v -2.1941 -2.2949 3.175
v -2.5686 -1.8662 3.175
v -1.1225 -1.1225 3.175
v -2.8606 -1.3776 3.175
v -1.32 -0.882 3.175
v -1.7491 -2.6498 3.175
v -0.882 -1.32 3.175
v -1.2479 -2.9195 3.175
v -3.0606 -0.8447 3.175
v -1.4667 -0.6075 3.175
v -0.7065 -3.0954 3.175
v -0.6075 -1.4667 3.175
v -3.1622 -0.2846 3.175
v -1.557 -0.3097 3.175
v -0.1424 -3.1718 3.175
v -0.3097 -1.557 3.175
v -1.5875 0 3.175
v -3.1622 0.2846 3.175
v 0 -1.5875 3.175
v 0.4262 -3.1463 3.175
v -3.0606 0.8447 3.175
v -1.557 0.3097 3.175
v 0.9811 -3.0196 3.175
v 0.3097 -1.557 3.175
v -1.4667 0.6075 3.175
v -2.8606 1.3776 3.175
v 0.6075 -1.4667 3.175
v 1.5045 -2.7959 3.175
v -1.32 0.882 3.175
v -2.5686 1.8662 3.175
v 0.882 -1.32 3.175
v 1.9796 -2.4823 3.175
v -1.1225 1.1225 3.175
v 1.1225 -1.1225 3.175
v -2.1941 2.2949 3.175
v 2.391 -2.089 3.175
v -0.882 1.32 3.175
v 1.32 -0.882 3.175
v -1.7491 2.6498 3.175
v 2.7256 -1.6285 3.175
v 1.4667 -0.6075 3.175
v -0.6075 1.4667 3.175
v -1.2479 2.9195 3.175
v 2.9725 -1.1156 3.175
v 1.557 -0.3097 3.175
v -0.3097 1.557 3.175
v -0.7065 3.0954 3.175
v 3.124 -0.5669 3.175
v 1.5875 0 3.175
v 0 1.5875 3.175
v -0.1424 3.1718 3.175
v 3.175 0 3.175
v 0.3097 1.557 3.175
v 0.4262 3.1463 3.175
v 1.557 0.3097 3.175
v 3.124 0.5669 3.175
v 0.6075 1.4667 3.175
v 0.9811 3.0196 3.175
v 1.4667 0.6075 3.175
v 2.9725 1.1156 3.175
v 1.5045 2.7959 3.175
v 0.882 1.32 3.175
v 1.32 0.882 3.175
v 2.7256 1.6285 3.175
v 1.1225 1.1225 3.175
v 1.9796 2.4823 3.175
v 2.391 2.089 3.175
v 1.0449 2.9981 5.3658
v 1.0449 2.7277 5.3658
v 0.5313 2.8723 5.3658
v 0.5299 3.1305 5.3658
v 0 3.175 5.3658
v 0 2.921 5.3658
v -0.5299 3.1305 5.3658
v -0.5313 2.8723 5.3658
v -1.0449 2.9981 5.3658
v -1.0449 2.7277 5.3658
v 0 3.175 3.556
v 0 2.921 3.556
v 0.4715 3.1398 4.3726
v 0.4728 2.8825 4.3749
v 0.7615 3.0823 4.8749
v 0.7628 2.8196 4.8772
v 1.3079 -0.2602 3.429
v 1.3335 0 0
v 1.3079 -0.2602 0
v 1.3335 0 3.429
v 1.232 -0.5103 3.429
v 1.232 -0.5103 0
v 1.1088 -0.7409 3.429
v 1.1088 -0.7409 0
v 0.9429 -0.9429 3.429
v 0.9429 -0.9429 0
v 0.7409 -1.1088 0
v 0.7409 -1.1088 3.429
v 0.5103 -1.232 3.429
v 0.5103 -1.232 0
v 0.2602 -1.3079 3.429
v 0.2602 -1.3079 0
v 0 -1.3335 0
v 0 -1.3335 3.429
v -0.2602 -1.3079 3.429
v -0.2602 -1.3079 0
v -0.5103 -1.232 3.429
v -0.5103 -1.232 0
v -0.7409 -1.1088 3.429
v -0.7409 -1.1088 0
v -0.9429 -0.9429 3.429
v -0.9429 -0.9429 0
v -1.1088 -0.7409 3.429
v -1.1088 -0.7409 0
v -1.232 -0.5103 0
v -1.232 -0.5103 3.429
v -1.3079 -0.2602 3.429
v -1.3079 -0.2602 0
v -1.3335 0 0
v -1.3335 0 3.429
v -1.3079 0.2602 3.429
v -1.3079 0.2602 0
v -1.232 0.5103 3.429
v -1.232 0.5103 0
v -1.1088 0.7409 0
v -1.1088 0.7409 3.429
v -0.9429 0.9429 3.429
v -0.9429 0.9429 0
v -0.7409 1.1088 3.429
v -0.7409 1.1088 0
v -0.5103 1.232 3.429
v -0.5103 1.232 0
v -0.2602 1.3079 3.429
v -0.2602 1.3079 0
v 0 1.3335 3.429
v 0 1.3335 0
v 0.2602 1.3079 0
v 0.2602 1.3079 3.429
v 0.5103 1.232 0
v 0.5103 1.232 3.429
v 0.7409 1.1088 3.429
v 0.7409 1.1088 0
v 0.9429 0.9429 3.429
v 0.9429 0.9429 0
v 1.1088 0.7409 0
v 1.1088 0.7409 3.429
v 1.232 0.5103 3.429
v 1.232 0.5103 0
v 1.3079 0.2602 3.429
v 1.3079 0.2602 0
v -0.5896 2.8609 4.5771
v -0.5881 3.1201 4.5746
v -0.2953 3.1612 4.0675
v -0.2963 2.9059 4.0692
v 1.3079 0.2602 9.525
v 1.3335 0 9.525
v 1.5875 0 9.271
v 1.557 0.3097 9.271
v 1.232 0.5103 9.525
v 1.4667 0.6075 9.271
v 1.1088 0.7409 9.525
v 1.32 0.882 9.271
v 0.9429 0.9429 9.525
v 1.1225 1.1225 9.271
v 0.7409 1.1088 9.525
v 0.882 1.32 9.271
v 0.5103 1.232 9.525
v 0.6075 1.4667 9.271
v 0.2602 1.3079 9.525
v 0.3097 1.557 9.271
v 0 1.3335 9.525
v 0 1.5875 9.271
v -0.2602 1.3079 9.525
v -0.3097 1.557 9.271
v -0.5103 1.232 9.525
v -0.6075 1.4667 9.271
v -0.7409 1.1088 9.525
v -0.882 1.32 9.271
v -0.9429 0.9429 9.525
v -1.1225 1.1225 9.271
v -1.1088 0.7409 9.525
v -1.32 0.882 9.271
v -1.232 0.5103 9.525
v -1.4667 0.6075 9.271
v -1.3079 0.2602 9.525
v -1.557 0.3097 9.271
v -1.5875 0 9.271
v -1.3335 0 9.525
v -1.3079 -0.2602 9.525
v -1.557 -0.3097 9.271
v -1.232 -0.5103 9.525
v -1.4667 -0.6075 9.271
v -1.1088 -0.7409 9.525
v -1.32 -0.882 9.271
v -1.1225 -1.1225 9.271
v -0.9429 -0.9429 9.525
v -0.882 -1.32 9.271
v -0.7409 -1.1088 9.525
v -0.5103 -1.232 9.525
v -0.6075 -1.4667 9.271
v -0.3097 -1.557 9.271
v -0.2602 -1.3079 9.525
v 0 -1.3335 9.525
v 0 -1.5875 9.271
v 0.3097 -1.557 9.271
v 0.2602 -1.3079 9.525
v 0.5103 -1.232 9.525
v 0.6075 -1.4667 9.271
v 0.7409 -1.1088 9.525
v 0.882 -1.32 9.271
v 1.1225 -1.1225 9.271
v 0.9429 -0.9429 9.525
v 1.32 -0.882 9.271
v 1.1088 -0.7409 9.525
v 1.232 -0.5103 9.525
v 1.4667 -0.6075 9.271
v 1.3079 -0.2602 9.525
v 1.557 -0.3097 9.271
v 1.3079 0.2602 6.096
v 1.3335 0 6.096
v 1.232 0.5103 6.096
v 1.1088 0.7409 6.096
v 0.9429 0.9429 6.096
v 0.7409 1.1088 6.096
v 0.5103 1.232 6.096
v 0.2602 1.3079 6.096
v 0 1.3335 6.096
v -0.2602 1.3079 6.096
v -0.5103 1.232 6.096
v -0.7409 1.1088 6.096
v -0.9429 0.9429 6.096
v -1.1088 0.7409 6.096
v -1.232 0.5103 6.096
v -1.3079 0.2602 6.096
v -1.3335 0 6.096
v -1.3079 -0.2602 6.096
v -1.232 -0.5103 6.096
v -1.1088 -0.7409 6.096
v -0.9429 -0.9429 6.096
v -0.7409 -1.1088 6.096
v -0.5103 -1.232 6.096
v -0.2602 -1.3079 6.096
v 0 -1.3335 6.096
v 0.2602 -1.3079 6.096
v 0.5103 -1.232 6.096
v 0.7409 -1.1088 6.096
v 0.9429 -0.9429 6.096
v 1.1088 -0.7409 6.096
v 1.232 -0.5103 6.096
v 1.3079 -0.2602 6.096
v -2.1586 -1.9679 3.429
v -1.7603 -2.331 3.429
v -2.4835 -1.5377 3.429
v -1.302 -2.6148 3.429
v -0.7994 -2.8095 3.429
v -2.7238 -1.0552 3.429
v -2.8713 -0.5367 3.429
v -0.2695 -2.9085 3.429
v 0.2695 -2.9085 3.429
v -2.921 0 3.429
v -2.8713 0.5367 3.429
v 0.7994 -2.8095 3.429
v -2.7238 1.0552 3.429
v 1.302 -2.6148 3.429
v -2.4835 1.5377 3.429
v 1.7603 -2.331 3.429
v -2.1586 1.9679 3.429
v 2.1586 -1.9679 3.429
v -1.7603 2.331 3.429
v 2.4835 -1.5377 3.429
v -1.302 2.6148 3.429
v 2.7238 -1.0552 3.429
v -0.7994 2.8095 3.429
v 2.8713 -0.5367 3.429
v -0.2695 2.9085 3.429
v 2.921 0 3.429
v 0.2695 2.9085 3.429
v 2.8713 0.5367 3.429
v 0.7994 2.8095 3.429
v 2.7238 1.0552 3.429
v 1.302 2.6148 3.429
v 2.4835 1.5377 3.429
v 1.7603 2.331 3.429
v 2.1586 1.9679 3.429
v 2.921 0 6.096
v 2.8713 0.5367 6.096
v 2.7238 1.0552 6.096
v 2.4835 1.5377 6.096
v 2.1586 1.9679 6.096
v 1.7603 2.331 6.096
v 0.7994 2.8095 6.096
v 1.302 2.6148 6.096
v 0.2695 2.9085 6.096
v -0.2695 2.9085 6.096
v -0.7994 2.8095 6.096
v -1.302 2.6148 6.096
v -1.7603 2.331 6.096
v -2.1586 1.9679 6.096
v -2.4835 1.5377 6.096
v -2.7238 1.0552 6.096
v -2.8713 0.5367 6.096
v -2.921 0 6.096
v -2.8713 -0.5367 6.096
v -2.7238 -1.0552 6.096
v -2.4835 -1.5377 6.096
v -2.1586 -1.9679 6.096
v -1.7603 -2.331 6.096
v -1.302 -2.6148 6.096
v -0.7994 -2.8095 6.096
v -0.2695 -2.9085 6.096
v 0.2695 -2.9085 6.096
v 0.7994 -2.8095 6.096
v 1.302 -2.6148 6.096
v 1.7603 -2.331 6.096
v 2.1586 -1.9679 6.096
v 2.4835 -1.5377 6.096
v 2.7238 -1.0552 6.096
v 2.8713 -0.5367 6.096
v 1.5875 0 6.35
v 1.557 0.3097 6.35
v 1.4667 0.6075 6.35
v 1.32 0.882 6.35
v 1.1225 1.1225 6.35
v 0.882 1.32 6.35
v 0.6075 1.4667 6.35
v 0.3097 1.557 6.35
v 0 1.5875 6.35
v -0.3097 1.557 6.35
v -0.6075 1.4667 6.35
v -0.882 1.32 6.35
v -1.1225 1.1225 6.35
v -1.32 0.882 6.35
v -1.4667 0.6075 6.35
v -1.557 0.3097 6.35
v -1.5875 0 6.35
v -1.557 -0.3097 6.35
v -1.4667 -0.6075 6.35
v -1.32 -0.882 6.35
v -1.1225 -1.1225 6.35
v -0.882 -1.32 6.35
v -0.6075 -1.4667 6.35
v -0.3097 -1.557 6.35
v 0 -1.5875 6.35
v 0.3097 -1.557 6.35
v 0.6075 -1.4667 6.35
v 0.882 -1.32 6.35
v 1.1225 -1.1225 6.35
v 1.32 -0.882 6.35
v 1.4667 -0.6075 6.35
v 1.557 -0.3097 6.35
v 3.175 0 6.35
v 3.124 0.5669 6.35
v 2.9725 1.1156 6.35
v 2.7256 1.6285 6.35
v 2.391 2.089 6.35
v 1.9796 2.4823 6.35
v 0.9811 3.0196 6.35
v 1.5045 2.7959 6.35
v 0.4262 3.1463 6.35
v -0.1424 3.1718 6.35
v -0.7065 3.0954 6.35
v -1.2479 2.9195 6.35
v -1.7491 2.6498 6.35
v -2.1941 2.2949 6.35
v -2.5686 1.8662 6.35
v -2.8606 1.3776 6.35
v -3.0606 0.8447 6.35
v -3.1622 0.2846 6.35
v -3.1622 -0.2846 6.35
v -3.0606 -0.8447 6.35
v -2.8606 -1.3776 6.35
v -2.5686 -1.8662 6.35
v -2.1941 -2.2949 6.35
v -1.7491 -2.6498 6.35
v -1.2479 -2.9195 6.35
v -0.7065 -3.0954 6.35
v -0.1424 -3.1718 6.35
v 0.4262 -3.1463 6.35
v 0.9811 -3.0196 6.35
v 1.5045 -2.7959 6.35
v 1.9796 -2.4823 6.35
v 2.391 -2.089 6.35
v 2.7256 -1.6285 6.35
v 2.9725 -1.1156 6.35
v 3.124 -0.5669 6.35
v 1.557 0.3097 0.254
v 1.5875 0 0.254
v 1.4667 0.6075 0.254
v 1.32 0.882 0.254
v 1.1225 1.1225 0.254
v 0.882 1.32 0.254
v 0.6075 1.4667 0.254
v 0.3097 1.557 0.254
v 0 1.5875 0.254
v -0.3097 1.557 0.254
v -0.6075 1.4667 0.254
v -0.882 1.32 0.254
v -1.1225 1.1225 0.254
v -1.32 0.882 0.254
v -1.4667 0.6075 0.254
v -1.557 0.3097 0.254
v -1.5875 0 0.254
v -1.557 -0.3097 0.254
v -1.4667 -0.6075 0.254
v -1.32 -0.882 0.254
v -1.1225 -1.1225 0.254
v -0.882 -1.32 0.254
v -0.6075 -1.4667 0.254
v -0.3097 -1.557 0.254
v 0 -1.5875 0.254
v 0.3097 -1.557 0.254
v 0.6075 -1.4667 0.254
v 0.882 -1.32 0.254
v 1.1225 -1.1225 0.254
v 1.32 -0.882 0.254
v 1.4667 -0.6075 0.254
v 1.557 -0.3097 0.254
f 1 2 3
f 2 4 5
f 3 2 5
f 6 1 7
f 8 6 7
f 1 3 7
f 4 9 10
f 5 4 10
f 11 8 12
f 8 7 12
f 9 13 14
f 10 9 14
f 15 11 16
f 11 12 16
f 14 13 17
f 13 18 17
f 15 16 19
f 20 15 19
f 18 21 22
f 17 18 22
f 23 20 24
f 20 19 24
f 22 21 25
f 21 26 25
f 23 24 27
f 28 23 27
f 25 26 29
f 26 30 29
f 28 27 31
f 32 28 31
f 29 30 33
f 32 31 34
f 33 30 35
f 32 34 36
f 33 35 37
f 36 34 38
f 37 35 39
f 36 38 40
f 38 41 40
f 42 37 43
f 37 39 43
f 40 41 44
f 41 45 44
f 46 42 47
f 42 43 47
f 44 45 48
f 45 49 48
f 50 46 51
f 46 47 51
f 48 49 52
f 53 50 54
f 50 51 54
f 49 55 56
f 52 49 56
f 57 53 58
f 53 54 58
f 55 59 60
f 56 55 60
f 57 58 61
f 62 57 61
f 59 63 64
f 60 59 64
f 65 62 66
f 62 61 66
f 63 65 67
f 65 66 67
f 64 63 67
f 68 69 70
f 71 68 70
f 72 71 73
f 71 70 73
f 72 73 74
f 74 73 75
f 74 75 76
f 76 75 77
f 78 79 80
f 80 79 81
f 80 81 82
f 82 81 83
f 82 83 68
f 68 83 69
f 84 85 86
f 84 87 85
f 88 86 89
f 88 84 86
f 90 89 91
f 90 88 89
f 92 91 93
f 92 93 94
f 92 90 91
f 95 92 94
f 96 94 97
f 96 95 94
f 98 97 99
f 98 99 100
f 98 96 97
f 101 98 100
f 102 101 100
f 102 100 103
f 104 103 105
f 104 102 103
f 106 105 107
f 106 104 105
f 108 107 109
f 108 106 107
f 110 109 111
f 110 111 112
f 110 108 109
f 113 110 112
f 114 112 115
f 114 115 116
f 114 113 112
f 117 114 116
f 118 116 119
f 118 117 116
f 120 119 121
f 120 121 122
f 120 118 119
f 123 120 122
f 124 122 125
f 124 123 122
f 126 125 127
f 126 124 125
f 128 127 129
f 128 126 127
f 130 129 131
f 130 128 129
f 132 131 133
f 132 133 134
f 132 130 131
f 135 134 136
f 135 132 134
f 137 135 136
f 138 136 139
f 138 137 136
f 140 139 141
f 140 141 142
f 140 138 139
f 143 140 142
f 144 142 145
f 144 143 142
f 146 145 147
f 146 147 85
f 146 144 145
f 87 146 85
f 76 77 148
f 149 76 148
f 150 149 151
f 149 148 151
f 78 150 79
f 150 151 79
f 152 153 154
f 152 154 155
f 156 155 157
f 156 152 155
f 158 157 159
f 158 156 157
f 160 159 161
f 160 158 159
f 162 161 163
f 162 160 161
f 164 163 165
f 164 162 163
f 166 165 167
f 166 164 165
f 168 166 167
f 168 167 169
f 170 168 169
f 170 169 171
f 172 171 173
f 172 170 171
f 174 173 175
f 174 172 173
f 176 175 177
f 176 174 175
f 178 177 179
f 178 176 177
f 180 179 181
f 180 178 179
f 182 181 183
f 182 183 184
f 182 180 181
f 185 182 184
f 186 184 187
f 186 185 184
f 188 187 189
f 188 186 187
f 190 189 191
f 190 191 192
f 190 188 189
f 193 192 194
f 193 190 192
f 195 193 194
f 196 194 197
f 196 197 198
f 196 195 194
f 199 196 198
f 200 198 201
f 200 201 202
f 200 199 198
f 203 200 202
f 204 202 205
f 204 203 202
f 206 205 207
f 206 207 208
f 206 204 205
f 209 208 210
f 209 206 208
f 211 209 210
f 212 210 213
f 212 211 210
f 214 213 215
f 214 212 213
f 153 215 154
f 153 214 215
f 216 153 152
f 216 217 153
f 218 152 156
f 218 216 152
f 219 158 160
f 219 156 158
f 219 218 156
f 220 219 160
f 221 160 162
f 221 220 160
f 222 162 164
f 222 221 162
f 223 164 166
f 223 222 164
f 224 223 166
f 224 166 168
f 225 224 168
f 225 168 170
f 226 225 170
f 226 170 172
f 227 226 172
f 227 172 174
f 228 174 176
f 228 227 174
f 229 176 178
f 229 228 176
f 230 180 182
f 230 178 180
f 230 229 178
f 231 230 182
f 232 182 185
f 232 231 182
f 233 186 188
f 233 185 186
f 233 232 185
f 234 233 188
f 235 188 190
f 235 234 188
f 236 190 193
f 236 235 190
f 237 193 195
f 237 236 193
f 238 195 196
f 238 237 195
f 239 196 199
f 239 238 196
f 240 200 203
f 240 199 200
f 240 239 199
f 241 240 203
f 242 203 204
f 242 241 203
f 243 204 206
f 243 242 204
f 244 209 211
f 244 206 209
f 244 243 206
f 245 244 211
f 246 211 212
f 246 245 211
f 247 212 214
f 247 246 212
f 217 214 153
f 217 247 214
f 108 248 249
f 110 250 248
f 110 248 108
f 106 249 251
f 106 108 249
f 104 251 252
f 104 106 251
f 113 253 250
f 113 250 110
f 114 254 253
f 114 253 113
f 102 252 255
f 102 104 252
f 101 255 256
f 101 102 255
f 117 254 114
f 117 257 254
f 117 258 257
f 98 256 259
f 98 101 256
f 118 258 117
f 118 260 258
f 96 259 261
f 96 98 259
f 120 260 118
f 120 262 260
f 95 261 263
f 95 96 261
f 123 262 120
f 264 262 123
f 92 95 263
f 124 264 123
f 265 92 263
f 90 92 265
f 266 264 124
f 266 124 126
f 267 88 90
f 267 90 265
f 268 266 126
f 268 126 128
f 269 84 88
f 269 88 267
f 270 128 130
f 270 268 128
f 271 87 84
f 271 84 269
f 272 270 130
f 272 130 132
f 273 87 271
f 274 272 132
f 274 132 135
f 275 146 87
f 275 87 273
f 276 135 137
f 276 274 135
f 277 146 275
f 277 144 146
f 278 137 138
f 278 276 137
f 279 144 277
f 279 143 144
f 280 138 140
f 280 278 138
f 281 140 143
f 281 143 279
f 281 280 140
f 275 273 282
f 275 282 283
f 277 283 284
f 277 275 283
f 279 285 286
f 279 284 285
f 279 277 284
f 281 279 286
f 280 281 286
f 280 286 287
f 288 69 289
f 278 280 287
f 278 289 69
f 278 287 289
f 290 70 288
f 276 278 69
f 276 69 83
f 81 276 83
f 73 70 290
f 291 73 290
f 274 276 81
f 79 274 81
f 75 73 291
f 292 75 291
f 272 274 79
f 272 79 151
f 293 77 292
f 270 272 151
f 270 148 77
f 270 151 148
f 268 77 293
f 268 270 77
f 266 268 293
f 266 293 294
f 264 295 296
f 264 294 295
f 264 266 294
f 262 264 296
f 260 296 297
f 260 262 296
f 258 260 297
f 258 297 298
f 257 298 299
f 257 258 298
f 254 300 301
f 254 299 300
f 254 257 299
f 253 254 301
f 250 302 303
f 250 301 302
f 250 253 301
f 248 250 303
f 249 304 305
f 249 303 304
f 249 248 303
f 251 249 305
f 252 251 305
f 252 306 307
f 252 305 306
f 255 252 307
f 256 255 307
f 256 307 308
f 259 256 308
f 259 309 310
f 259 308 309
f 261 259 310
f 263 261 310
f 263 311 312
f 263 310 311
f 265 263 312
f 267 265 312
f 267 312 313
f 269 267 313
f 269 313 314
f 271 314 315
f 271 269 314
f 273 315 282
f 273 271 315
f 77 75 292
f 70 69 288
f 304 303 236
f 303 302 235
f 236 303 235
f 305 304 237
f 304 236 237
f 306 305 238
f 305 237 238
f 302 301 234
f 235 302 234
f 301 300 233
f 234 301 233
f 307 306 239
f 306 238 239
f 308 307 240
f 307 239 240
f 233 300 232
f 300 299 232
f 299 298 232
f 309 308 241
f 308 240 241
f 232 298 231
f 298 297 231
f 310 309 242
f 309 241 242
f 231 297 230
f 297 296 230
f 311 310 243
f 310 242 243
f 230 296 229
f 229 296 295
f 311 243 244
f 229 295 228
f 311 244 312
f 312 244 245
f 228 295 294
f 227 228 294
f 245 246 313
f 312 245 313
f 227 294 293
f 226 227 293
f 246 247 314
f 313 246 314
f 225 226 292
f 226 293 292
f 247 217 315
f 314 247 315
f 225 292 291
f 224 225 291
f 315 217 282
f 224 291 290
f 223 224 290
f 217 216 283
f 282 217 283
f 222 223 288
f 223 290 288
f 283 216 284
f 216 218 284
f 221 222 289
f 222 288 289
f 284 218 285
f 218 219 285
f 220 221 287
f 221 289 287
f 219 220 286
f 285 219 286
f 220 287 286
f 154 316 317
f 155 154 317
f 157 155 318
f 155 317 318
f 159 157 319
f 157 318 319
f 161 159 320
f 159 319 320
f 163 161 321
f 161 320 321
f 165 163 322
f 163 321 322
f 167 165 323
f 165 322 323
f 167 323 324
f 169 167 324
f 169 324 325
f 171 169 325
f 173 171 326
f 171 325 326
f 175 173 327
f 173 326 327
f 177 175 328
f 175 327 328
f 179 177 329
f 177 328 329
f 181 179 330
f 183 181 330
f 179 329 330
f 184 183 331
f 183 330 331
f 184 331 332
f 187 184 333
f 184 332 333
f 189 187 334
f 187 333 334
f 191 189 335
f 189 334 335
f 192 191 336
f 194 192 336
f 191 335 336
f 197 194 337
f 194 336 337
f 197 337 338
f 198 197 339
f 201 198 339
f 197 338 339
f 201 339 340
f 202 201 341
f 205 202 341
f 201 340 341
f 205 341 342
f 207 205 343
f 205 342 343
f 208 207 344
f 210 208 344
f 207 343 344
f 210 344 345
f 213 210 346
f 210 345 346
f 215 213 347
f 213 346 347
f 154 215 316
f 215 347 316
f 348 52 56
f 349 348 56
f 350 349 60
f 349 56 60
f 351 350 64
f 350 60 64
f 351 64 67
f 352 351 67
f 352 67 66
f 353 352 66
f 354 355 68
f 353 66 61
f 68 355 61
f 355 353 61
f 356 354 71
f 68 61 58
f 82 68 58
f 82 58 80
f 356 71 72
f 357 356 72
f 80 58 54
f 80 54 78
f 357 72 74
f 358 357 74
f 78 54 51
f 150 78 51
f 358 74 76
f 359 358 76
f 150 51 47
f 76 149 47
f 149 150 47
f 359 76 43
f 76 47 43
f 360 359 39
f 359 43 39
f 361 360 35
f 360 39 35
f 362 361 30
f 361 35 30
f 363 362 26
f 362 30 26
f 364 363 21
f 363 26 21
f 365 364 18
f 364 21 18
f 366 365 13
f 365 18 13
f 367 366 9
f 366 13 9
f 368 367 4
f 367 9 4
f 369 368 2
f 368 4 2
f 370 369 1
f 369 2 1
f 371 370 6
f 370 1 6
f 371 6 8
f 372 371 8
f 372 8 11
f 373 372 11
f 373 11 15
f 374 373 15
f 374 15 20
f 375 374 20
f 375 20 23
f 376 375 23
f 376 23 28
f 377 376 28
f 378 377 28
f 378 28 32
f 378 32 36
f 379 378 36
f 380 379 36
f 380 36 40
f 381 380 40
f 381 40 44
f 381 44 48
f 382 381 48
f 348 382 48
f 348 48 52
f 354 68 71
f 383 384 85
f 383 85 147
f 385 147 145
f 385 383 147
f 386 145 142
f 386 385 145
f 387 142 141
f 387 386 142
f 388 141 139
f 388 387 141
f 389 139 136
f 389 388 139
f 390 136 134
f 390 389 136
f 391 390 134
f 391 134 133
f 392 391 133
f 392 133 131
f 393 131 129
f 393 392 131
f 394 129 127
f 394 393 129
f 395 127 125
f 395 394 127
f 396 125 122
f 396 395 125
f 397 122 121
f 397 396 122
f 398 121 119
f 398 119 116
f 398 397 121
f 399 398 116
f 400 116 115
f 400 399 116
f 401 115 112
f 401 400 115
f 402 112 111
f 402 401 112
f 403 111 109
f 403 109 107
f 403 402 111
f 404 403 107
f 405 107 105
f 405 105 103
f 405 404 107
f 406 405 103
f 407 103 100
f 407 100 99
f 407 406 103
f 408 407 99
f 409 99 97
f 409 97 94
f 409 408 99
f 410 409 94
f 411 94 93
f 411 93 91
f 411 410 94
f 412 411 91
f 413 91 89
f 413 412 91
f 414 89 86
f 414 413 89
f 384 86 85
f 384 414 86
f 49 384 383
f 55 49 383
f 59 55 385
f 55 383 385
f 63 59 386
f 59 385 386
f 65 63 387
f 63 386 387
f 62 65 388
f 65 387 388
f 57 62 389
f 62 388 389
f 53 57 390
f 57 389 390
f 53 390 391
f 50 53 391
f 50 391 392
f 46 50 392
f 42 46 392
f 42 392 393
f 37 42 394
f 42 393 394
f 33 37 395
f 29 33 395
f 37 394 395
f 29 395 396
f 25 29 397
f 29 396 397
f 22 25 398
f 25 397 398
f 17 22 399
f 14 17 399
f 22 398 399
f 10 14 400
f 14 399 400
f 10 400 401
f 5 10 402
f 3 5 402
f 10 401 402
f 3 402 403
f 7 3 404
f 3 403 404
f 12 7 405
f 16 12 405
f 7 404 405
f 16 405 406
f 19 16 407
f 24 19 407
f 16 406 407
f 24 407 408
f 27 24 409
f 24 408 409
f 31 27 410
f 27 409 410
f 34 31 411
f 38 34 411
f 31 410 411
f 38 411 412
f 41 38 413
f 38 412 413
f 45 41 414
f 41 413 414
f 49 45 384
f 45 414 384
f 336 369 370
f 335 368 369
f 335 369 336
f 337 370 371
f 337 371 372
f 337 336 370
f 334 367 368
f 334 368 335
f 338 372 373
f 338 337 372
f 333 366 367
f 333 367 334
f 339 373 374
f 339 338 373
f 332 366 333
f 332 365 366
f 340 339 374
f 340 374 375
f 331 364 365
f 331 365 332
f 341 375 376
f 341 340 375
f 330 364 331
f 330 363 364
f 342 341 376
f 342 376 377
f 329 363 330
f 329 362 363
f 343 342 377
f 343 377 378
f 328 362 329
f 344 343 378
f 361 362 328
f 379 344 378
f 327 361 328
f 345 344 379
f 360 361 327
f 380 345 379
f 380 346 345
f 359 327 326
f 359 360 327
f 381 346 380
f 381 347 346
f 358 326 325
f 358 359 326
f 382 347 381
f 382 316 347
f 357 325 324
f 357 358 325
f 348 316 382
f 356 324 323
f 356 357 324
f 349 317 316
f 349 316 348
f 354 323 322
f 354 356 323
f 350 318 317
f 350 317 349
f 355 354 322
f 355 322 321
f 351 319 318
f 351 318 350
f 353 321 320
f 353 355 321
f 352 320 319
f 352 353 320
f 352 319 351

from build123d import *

# Parameters (mm, degrees)
F0_R      = 1.5875
F1_DEPTH  = 3.175
F2_R      = 3.175
F3_DEPTH  = 3.175
F4_R      = 1.5875
F5_DEPTH  = 3.175
F6_T      = -0.254
F7_DEPTH  = 0.254
F8_SIZE   = 0.25399
F10_DEPTH = 4.175


# Not quite as in the source:
# - a fillet or chamfer is up to 0.001 mm smaller than in the source, because OpenCascade refuses the exact size


with BuildPart() as f1:
    # F0 (on Top) → F1 (new body)
    with BuildSketch(Plane.XY):
        Circle(F0_R)
    extrude(amount=F1_DEPTH)

    # F2 (on face) → F3 (join)
    with BuildSketch(Plane.XY.offset(3.175)):
        Circle(F2_R)
    extrude(amount=F3_DEPTH)

    # F4 (on face) → F5 (join)
    with BuildSketch(Plane.XY.offset(6.35)):
        Circle(F4_R)
    extrude(amount=F5_DEPTH)

    # F6
    f6_openings = [f1.faces().sort_by_distance(p)[0] for p in [
        (0, 0, 9.525),
    ]]
    offset(amount=F6_T, openings=f6_openings, kind=Kind.INTERSECTION)

    # F7 (cut, through all): a face of the model
    f7_faces = [f1.faces().sort_by_distance(p)[0] for p in [
        (0, 0, 0.254),
    ]]
    extrude(f7_faces, amount=-F7_DEPTH, mode=Mode.SUBTRACT)

    # F8 (size 0.254 in the source; OpenCascade refuses exactly that, so slightly less here)
    f8_edges = [f1.edges().sort_by_distance(p)[0] for p in [
        (-1.5875, 0, 9.525),
        (-1.5875, 0, 0),
    ]]
    chamfer(f8_edges, length=F8_SIZE)

    # F9 (on Front) → F10 (cut, up to face)
    with BuildSketch(Plane.XZ):
        Polygon((1.0448596497, 5.36575), (-1.0448596497, 5.36575), (0, 3.556), align=None)
    extrude(amount=-F10_DEPTH, mode=Mode.SUBTRACT)


solid = f1.part
